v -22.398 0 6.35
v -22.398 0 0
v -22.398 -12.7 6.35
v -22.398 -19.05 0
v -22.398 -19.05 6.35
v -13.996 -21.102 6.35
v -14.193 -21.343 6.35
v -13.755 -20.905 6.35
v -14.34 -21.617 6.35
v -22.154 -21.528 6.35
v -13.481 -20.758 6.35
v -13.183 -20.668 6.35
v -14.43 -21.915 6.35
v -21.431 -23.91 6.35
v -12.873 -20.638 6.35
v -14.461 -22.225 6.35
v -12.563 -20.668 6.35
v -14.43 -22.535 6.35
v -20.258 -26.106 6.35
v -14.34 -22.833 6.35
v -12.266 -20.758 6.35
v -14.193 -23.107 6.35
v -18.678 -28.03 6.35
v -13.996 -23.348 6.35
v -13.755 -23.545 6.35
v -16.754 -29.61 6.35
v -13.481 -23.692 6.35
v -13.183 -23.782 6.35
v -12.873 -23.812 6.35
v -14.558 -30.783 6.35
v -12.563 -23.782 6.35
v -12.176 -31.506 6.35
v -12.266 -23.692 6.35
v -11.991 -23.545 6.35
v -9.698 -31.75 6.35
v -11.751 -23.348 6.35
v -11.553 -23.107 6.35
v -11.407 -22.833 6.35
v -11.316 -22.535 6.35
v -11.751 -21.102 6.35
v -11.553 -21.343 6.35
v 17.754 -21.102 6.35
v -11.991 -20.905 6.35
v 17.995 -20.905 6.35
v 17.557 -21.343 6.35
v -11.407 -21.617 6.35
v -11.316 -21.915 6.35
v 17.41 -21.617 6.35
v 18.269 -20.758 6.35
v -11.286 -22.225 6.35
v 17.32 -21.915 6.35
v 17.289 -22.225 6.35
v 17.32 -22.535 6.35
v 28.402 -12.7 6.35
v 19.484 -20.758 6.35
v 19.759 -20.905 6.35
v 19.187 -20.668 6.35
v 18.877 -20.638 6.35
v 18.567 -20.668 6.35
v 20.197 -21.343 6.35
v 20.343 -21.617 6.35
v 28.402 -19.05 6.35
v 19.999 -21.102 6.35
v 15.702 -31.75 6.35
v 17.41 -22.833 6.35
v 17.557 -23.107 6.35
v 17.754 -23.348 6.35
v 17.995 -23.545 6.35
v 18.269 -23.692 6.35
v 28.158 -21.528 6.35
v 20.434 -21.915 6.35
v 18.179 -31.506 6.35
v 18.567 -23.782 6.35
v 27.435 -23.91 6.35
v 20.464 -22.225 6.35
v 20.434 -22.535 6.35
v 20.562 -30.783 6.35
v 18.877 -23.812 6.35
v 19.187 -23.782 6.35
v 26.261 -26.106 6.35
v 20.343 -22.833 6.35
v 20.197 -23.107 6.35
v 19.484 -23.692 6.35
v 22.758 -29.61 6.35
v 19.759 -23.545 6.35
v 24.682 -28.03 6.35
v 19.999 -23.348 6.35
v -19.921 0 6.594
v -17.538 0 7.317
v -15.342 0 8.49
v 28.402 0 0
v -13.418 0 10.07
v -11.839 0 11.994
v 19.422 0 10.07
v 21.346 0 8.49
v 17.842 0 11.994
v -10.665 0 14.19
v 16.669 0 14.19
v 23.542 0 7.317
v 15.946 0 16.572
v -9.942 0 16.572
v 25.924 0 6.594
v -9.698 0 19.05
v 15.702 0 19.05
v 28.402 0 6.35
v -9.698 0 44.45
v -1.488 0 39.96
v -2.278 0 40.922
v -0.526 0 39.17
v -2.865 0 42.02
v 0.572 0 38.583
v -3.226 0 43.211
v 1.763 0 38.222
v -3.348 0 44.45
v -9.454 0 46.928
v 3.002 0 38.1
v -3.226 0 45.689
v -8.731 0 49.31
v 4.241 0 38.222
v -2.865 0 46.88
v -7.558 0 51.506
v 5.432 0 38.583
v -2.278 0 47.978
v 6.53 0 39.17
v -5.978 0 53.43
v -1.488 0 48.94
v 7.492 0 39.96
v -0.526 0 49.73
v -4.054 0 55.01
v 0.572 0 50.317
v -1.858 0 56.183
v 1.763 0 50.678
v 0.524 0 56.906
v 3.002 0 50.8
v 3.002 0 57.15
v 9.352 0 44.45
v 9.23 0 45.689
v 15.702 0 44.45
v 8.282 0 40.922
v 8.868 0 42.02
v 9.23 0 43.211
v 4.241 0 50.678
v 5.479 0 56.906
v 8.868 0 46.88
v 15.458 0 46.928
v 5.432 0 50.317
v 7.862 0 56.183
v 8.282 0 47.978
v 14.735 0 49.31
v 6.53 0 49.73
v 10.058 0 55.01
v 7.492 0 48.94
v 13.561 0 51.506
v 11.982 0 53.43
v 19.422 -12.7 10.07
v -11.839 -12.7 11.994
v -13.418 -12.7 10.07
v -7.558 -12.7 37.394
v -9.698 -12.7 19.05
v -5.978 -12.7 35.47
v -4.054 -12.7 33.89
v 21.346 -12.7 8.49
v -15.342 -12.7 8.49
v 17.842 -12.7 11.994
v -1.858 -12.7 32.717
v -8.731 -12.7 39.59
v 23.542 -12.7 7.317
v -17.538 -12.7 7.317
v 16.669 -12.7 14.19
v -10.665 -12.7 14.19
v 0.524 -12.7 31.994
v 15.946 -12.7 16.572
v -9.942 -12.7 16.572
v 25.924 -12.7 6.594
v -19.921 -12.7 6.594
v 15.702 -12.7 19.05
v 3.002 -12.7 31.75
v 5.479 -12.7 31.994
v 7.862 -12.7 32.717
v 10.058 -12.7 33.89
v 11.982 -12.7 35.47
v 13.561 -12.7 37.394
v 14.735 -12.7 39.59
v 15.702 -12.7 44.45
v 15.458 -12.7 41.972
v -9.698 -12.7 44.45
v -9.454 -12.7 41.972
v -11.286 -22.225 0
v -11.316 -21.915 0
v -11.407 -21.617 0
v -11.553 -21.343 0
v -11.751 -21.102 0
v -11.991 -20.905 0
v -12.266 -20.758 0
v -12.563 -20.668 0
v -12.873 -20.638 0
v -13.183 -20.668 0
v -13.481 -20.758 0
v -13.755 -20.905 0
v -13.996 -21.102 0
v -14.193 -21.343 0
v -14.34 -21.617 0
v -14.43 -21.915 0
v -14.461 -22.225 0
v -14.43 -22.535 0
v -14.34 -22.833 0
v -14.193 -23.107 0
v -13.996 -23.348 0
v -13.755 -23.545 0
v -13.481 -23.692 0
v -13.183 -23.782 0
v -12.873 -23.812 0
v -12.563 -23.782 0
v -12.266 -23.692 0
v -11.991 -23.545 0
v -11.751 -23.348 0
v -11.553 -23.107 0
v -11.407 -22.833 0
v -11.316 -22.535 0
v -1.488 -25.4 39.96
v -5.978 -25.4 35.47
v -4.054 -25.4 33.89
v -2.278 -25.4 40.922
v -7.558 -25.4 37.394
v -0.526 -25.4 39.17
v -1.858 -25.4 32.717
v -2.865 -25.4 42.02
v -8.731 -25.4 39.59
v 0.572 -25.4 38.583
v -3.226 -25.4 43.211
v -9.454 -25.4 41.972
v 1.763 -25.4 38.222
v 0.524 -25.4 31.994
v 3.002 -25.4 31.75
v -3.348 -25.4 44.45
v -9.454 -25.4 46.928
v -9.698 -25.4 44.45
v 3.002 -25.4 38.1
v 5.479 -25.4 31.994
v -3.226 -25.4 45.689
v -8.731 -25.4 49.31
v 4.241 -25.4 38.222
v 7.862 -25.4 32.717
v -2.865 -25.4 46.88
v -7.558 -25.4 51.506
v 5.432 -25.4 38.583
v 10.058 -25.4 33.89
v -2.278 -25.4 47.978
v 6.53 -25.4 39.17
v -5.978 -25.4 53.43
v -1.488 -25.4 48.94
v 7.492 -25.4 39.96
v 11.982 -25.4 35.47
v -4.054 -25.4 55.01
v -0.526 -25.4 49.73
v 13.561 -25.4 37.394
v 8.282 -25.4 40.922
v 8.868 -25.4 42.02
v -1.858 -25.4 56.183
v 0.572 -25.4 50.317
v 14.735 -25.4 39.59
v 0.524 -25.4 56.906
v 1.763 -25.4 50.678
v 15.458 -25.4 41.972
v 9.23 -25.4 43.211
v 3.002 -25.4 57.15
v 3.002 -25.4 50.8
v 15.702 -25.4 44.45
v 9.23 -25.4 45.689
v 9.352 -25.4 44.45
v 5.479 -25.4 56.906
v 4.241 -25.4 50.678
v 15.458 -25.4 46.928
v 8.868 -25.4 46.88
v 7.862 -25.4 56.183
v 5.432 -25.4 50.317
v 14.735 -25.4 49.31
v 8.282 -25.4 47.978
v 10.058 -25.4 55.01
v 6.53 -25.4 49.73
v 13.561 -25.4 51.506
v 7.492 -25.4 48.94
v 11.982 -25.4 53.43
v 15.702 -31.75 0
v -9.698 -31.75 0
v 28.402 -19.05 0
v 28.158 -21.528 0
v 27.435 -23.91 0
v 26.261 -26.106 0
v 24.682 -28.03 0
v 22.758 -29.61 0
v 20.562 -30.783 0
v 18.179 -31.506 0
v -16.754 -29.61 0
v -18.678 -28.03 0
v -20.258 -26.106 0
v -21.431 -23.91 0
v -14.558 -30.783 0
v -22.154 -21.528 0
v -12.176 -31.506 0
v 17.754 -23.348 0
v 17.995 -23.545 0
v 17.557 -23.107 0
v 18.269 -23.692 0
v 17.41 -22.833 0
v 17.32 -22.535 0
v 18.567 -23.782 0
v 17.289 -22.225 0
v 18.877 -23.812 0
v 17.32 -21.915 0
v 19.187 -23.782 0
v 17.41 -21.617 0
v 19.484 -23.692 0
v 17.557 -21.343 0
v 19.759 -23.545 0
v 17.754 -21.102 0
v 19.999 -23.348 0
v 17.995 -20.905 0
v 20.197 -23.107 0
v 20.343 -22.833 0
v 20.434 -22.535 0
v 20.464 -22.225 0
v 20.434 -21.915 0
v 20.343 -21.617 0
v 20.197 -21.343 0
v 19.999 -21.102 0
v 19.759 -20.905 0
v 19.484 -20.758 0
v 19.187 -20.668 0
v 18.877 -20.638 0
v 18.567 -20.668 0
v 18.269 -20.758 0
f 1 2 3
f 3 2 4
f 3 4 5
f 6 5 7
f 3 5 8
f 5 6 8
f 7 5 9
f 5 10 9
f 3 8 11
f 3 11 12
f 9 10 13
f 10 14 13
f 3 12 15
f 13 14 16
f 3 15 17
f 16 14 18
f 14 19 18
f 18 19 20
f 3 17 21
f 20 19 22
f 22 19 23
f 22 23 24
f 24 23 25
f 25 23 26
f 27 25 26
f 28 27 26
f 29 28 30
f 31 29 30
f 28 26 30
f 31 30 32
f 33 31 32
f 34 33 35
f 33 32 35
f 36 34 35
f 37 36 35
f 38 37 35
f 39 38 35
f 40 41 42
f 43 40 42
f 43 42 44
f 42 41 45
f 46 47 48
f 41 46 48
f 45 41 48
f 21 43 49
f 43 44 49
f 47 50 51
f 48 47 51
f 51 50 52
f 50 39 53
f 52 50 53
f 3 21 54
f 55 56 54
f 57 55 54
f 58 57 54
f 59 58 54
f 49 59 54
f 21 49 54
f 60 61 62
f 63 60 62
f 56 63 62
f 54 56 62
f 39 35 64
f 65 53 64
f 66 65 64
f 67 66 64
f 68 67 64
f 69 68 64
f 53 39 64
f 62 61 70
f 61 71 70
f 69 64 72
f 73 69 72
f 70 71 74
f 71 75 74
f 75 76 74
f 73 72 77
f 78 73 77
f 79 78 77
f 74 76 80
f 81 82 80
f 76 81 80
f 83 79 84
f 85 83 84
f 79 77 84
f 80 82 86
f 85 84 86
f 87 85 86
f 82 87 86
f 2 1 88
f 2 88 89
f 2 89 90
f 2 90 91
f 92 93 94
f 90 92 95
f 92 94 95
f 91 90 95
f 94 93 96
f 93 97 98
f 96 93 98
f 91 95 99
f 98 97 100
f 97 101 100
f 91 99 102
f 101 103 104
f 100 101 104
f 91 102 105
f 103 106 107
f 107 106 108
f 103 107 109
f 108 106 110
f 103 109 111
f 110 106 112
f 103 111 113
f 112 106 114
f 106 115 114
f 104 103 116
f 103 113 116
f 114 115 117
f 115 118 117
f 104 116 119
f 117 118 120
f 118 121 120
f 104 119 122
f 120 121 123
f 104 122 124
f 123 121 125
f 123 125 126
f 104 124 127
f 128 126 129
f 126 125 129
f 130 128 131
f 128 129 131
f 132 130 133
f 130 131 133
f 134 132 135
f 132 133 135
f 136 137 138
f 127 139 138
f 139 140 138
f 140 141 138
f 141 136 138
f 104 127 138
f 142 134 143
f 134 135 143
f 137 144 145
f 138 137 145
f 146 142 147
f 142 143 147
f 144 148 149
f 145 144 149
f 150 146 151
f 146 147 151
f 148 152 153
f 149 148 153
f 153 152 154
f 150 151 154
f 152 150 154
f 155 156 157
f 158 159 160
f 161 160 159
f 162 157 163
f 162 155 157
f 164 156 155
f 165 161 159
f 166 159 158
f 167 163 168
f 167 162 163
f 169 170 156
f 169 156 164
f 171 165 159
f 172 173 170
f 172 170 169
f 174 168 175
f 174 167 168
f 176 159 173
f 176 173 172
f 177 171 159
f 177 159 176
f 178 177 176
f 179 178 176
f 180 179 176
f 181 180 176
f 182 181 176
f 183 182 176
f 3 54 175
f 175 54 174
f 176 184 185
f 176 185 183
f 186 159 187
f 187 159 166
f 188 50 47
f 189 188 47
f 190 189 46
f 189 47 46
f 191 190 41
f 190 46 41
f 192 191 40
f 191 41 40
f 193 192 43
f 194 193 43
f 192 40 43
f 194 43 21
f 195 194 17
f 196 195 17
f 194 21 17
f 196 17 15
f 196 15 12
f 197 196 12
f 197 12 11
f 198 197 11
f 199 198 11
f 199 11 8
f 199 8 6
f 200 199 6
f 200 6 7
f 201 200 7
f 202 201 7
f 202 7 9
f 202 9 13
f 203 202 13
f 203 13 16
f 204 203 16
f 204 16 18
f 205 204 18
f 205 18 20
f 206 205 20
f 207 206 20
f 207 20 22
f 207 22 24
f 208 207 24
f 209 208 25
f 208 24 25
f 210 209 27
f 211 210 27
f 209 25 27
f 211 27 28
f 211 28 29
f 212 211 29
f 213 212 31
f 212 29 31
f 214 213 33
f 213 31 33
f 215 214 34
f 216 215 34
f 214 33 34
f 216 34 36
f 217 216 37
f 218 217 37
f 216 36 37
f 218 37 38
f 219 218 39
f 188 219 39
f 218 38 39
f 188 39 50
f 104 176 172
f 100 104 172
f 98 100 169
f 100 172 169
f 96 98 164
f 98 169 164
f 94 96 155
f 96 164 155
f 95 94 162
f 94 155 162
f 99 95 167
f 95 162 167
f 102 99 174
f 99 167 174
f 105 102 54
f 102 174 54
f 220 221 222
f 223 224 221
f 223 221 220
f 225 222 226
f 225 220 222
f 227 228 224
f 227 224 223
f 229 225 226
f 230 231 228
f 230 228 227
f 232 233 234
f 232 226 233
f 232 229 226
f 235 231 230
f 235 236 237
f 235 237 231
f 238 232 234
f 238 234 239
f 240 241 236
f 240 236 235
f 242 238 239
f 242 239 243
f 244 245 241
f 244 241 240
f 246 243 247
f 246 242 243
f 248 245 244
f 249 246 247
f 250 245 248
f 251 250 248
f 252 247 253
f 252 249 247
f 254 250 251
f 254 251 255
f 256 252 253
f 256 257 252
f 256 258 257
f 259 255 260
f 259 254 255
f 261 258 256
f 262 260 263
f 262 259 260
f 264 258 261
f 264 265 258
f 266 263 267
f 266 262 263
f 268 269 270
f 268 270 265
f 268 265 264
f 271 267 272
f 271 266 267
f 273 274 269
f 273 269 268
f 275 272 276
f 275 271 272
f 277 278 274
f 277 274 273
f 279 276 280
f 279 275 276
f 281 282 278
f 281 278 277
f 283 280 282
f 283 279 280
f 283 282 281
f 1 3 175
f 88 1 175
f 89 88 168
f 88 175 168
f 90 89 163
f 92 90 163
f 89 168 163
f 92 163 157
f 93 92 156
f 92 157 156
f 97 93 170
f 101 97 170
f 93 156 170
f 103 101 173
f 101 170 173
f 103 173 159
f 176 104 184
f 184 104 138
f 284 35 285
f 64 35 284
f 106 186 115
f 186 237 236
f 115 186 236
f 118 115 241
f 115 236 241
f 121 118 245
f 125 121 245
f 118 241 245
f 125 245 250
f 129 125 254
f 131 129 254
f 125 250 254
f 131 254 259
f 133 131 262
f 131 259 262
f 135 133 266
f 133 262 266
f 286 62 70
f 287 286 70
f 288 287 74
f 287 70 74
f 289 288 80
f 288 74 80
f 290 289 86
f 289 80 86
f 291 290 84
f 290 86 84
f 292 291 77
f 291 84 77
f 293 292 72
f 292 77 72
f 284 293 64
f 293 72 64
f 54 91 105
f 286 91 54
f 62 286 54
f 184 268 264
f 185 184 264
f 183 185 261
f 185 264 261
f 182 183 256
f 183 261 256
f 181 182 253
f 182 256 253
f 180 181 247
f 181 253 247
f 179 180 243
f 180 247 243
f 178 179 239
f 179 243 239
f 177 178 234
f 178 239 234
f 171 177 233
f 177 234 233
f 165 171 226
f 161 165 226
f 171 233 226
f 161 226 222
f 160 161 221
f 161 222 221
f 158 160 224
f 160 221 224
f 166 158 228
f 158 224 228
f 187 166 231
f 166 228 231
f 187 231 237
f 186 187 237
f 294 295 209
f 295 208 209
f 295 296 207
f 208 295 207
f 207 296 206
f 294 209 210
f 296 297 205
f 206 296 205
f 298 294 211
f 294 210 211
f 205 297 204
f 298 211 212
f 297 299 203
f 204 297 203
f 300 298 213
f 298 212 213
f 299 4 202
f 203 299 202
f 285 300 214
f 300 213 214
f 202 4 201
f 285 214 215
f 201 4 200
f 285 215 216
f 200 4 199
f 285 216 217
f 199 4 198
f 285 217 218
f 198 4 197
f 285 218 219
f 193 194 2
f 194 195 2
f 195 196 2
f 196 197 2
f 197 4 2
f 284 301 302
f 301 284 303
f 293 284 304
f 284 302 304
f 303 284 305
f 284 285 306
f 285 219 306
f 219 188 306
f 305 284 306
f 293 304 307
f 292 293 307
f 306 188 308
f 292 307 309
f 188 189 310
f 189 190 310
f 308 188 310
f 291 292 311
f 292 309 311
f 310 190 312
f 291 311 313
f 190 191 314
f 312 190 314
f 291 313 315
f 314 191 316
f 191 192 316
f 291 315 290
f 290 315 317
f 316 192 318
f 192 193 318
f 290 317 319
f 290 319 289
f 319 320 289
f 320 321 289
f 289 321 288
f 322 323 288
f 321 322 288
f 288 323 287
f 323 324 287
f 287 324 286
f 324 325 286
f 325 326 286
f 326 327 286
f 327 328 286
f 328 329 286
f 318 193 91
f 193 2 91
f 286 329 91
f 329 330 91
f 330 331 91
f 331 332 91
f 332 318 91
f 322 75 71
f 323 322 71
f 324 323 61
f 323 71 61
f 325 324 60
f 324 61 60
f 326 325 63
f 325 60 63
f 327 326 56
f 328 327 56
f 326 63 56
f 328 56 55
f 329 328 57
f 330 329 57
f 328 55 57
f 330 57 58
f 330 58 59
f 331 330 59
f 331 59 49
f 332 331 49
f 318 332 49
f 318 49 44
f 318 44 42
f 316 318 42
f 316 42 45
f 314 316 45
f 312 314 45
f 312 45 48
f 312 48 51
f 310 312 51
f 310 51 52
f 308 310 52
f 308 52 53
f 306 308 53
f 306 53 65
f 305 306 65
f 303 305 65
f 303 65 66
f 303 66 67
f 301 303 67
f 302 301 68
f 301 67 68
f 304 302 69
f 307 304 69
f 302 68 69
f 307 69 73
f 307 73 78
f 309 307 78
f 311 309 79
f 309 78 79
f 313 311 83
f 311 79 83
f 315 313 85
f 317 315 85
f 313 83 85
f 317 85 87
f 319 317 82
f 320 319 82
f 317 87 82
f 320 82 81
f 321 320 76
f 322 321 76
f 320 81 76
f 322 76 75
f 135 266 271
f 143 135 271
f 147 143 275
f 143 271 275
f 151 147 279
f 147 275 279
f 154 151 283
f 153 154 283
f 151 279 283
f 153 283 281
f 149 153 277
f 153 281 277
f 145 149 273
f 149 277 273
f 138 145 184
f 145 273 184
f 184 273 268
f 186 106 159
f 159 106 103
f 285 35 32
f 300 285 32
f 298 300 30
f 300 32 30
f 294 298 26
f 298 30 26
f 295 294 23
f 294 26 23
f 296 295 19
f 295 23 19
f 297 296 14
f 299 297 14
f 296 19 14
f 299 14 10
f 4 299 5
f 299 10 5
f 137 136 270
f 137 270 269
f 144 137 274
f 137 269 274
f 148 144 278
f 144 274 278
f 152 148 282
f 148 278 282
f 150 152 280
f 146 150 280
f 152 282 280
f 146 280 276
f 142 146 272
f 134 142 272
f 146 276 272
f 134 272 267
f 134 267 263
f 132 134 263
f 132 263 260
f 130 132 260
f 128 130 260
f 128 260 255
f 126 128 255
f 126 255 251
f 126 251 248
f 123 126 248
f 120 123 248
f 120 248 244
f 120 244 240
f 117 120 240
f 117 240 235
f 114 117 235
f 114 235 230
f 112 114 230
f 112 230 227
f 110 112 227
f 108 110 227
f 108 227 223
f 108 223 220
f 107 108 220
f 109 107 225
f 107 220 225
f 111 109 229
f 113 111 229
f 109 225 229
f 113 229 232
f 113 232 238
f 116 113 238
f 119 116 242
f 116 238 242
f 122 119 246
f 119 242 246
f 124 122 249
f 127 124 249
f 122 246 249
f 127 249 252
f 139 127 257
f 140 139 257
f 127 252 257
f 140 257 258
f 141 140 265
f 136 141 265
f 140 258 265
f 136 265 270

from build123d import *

# Parameters (mm, degrees)
F1_DEPTH  = 31.75
F2_R      = 6.35
F3_DEPTH  = 31.75
F5_DEPTH  = 31.75
F7_DEPTH  = 19.05
F8_DEPTH  = 6.35
F9_W      = 12.7
F9_H      = 12.7
F10_DEPTH = 31.75
F11_W     = 12.7
F11_H     = 12.7
F12_DEPTH = 19.05
F14_DEPTH = 12.7
F15_W     = 12.7
F15_H     = 12.7
F16_DEPTH = 12.7
F18_DEPTH = 12.7
F19_R     = 1.5875
F20_DEPTH = 12.7
F22_DEPTH = 6.35


with BuildPart() as f1:
    # F0 (on Front) → F1 (new body)
    with BuildSketch(Plane.XZ):
        Polygon((-9.6981803781, 6.35), (-22.3981803781, 6.35), (-22.3981803781, 0), (28.4018196219, 0), (28.4018196219, 6.35), (15.7018196219, 6.35), (15.7018196219, 57.15), (-9.6981803781, 57.15), align=None)
    extrude(amount=F1_DEPTH)

    # F2 (on face) → F3 (cut)
    with BuildSketch(Plane.XZ.offset(31.75)):
        with Locations((3.0018196219, 44.45)):
            Circle(F2_R)
    extrude(amount=-F3_DEPTH, mode=Mode.SUBTRACT)

    # F4 (on face) → F5 (cut)
    with BuildSketch(Plane.XZ.offset(31.75)):
        with BuildLine():
            ThreePointArc((-9.6981803781, 44.45), (-5.9784365163, 53.4302561039), (3.0018195733, 57.15))
            Line((3.0018195733, 57.15), (-9.6981803781, 57.15))
            Line((-9.6981803781, 57.15), (-9.6981803781, 44.45))
        make_face()
        with BuildLine():
            ThreePointArc((3.0018195733, 57.15), (11.9820757258, 53.4302561383), (15.7018196219, 44.45))
            Line((15.7018196219, 44.45), (15.7018196219, 57.15))
            Line((15.7018196219, 57.15), (3.0018195733, 57.15))
        make_face()
    extrude(amount=-F5_DEPTH, mode=Mode.SUBTRACT)

    # F6 (on face) → F7 (cut)
    with BuildSketch(Plane.XZ.offset(31.75)):
        with BuildLine():
            Line((15.7018196219, 6.35), (15.7018196219, 44.45))
            ThreePointArc((15.7018196219, 44.45), (3.0018196219, 31.75), (-9.6981803781, 44.45))
            Line((-9.6981803781, 44.45), (-9.6981803781, 6.35))
            Line((-9.6981803781, 6.35), (15.7018196219, 6.35))
        make_face()
    extrude(amount=-F7_DEPTH, mode=Mode.SUBTRACT)

    # F8 (cut): a face of the model
    f8_faces = [f1.faces().sort_by_distance(p)[0] for p in [
        (15.3426093771, -31.75, 44.45),
    ]]
    extrude(f8_faces, amount=-F8_DEPTH, mode=Mode.SUBTRACT)

    # F9 (on face) → F10 (join)
    with BuildSketch(Plane.XZ.offset(31.75)):
        with Locations((-16.0481803781, 12.7)):
            Rectangle(F9_W, F9_H)
    extrude(amount=-F10_DEPTH)

    # F11 (on face) → F12 (cut)
    with BuildSketch(Plane.XZ.offset(31.75)):
        with Locations((-16.0481803781, 12.7)):
            Rectangle(F11_W, F11_H)
    extrude(amount=-F12_DEPTH, mode=Mode.SUBTRACT)

    # F13 (on face) → F14 (cut)
    with BuildSketch(Plane.XZ.offset(12.7)):
        with BuildLine():
            Line((-22.3981803781, 19.05), (-22.3981803781, 6.35))
            ThreePointArc((-22.3981803781, 6.35), (-13.417924257, 10.0697438789), (-9.6981803781, 19.05))
            Line((-9.6981803781, 19.05), (-22.3981803781, 19.05))
        make_face()
    extrude(amount=-F14_DEPTH, mode=Mode.SUBTRACT)

    # F15 (on face) → F16 (join)
    with BuildSketch(Plane.XZ.offset(12.7)):
        with Locations((22.0518196219, 12.7)):
            Rectangle(F15_W, F15_H)
    extrude(amount=-F16_DEPTH)

    # F17 (on face) → F18 (cut)
    with BuildSketch(Plane.XZ.offset(12.7)):
        with BuildLine():
            Line((28.4018196219, 19.05), (15.7018196219, 19.05))
            ThreePointArc((15.7018196219, 19.05), (19.4215635009, 10.0697438789), (28.4018196219, 6.35))
            Line((28.4018196219, 6.35), (28.4018196219, 19.05))
        make_face()
    extrude(amount=-F18_DEPTH, mode=Mode.SUBTRACT)

    # F19 (on face) → F20 (cut)
    with BuildSketch(Plane.XY.offset(6.35)):
        with Locations((-12.8731803781, -22.225)):
            Circle(F19_R)
        with Locations((18.8768196219, -22.225)):
            Circle(F19_R)
    extrude(amount=-F20_DEPTH, mode=Mode.SUBTRACT)

    # F21 (on face) → F22 (cut)
    with BuildSketch(Plane.XY.offset(6.35)):
        with BuildLine():
            ThreePointArc((-9.6981803781, -31.75), (-18.6784364991, -28.0302561211), (-22.3981803781, -19.05))
            Line((-22.3981803781, -19.05), (-22.3981803781, -31.75))
            Line((-22.3981803781, -31.75), (-9.6981803781, -31.75))
        make_face()
        with BuildLine():
            ThreePointArc((28.4018196219, -19.05), (24.682075743, -28.0302561211), (15.7018196219, -31.75))
            Line((15.7018196219, -31.75), (28.4018196219, -31.75))
            Line((28.4018196219, -31.75), (28.4018196219, -19.05))
        make_face()
    extrude(amount=-F22_DEPTH, mode=Mode.SUBTRACT)


solid = f1.part
